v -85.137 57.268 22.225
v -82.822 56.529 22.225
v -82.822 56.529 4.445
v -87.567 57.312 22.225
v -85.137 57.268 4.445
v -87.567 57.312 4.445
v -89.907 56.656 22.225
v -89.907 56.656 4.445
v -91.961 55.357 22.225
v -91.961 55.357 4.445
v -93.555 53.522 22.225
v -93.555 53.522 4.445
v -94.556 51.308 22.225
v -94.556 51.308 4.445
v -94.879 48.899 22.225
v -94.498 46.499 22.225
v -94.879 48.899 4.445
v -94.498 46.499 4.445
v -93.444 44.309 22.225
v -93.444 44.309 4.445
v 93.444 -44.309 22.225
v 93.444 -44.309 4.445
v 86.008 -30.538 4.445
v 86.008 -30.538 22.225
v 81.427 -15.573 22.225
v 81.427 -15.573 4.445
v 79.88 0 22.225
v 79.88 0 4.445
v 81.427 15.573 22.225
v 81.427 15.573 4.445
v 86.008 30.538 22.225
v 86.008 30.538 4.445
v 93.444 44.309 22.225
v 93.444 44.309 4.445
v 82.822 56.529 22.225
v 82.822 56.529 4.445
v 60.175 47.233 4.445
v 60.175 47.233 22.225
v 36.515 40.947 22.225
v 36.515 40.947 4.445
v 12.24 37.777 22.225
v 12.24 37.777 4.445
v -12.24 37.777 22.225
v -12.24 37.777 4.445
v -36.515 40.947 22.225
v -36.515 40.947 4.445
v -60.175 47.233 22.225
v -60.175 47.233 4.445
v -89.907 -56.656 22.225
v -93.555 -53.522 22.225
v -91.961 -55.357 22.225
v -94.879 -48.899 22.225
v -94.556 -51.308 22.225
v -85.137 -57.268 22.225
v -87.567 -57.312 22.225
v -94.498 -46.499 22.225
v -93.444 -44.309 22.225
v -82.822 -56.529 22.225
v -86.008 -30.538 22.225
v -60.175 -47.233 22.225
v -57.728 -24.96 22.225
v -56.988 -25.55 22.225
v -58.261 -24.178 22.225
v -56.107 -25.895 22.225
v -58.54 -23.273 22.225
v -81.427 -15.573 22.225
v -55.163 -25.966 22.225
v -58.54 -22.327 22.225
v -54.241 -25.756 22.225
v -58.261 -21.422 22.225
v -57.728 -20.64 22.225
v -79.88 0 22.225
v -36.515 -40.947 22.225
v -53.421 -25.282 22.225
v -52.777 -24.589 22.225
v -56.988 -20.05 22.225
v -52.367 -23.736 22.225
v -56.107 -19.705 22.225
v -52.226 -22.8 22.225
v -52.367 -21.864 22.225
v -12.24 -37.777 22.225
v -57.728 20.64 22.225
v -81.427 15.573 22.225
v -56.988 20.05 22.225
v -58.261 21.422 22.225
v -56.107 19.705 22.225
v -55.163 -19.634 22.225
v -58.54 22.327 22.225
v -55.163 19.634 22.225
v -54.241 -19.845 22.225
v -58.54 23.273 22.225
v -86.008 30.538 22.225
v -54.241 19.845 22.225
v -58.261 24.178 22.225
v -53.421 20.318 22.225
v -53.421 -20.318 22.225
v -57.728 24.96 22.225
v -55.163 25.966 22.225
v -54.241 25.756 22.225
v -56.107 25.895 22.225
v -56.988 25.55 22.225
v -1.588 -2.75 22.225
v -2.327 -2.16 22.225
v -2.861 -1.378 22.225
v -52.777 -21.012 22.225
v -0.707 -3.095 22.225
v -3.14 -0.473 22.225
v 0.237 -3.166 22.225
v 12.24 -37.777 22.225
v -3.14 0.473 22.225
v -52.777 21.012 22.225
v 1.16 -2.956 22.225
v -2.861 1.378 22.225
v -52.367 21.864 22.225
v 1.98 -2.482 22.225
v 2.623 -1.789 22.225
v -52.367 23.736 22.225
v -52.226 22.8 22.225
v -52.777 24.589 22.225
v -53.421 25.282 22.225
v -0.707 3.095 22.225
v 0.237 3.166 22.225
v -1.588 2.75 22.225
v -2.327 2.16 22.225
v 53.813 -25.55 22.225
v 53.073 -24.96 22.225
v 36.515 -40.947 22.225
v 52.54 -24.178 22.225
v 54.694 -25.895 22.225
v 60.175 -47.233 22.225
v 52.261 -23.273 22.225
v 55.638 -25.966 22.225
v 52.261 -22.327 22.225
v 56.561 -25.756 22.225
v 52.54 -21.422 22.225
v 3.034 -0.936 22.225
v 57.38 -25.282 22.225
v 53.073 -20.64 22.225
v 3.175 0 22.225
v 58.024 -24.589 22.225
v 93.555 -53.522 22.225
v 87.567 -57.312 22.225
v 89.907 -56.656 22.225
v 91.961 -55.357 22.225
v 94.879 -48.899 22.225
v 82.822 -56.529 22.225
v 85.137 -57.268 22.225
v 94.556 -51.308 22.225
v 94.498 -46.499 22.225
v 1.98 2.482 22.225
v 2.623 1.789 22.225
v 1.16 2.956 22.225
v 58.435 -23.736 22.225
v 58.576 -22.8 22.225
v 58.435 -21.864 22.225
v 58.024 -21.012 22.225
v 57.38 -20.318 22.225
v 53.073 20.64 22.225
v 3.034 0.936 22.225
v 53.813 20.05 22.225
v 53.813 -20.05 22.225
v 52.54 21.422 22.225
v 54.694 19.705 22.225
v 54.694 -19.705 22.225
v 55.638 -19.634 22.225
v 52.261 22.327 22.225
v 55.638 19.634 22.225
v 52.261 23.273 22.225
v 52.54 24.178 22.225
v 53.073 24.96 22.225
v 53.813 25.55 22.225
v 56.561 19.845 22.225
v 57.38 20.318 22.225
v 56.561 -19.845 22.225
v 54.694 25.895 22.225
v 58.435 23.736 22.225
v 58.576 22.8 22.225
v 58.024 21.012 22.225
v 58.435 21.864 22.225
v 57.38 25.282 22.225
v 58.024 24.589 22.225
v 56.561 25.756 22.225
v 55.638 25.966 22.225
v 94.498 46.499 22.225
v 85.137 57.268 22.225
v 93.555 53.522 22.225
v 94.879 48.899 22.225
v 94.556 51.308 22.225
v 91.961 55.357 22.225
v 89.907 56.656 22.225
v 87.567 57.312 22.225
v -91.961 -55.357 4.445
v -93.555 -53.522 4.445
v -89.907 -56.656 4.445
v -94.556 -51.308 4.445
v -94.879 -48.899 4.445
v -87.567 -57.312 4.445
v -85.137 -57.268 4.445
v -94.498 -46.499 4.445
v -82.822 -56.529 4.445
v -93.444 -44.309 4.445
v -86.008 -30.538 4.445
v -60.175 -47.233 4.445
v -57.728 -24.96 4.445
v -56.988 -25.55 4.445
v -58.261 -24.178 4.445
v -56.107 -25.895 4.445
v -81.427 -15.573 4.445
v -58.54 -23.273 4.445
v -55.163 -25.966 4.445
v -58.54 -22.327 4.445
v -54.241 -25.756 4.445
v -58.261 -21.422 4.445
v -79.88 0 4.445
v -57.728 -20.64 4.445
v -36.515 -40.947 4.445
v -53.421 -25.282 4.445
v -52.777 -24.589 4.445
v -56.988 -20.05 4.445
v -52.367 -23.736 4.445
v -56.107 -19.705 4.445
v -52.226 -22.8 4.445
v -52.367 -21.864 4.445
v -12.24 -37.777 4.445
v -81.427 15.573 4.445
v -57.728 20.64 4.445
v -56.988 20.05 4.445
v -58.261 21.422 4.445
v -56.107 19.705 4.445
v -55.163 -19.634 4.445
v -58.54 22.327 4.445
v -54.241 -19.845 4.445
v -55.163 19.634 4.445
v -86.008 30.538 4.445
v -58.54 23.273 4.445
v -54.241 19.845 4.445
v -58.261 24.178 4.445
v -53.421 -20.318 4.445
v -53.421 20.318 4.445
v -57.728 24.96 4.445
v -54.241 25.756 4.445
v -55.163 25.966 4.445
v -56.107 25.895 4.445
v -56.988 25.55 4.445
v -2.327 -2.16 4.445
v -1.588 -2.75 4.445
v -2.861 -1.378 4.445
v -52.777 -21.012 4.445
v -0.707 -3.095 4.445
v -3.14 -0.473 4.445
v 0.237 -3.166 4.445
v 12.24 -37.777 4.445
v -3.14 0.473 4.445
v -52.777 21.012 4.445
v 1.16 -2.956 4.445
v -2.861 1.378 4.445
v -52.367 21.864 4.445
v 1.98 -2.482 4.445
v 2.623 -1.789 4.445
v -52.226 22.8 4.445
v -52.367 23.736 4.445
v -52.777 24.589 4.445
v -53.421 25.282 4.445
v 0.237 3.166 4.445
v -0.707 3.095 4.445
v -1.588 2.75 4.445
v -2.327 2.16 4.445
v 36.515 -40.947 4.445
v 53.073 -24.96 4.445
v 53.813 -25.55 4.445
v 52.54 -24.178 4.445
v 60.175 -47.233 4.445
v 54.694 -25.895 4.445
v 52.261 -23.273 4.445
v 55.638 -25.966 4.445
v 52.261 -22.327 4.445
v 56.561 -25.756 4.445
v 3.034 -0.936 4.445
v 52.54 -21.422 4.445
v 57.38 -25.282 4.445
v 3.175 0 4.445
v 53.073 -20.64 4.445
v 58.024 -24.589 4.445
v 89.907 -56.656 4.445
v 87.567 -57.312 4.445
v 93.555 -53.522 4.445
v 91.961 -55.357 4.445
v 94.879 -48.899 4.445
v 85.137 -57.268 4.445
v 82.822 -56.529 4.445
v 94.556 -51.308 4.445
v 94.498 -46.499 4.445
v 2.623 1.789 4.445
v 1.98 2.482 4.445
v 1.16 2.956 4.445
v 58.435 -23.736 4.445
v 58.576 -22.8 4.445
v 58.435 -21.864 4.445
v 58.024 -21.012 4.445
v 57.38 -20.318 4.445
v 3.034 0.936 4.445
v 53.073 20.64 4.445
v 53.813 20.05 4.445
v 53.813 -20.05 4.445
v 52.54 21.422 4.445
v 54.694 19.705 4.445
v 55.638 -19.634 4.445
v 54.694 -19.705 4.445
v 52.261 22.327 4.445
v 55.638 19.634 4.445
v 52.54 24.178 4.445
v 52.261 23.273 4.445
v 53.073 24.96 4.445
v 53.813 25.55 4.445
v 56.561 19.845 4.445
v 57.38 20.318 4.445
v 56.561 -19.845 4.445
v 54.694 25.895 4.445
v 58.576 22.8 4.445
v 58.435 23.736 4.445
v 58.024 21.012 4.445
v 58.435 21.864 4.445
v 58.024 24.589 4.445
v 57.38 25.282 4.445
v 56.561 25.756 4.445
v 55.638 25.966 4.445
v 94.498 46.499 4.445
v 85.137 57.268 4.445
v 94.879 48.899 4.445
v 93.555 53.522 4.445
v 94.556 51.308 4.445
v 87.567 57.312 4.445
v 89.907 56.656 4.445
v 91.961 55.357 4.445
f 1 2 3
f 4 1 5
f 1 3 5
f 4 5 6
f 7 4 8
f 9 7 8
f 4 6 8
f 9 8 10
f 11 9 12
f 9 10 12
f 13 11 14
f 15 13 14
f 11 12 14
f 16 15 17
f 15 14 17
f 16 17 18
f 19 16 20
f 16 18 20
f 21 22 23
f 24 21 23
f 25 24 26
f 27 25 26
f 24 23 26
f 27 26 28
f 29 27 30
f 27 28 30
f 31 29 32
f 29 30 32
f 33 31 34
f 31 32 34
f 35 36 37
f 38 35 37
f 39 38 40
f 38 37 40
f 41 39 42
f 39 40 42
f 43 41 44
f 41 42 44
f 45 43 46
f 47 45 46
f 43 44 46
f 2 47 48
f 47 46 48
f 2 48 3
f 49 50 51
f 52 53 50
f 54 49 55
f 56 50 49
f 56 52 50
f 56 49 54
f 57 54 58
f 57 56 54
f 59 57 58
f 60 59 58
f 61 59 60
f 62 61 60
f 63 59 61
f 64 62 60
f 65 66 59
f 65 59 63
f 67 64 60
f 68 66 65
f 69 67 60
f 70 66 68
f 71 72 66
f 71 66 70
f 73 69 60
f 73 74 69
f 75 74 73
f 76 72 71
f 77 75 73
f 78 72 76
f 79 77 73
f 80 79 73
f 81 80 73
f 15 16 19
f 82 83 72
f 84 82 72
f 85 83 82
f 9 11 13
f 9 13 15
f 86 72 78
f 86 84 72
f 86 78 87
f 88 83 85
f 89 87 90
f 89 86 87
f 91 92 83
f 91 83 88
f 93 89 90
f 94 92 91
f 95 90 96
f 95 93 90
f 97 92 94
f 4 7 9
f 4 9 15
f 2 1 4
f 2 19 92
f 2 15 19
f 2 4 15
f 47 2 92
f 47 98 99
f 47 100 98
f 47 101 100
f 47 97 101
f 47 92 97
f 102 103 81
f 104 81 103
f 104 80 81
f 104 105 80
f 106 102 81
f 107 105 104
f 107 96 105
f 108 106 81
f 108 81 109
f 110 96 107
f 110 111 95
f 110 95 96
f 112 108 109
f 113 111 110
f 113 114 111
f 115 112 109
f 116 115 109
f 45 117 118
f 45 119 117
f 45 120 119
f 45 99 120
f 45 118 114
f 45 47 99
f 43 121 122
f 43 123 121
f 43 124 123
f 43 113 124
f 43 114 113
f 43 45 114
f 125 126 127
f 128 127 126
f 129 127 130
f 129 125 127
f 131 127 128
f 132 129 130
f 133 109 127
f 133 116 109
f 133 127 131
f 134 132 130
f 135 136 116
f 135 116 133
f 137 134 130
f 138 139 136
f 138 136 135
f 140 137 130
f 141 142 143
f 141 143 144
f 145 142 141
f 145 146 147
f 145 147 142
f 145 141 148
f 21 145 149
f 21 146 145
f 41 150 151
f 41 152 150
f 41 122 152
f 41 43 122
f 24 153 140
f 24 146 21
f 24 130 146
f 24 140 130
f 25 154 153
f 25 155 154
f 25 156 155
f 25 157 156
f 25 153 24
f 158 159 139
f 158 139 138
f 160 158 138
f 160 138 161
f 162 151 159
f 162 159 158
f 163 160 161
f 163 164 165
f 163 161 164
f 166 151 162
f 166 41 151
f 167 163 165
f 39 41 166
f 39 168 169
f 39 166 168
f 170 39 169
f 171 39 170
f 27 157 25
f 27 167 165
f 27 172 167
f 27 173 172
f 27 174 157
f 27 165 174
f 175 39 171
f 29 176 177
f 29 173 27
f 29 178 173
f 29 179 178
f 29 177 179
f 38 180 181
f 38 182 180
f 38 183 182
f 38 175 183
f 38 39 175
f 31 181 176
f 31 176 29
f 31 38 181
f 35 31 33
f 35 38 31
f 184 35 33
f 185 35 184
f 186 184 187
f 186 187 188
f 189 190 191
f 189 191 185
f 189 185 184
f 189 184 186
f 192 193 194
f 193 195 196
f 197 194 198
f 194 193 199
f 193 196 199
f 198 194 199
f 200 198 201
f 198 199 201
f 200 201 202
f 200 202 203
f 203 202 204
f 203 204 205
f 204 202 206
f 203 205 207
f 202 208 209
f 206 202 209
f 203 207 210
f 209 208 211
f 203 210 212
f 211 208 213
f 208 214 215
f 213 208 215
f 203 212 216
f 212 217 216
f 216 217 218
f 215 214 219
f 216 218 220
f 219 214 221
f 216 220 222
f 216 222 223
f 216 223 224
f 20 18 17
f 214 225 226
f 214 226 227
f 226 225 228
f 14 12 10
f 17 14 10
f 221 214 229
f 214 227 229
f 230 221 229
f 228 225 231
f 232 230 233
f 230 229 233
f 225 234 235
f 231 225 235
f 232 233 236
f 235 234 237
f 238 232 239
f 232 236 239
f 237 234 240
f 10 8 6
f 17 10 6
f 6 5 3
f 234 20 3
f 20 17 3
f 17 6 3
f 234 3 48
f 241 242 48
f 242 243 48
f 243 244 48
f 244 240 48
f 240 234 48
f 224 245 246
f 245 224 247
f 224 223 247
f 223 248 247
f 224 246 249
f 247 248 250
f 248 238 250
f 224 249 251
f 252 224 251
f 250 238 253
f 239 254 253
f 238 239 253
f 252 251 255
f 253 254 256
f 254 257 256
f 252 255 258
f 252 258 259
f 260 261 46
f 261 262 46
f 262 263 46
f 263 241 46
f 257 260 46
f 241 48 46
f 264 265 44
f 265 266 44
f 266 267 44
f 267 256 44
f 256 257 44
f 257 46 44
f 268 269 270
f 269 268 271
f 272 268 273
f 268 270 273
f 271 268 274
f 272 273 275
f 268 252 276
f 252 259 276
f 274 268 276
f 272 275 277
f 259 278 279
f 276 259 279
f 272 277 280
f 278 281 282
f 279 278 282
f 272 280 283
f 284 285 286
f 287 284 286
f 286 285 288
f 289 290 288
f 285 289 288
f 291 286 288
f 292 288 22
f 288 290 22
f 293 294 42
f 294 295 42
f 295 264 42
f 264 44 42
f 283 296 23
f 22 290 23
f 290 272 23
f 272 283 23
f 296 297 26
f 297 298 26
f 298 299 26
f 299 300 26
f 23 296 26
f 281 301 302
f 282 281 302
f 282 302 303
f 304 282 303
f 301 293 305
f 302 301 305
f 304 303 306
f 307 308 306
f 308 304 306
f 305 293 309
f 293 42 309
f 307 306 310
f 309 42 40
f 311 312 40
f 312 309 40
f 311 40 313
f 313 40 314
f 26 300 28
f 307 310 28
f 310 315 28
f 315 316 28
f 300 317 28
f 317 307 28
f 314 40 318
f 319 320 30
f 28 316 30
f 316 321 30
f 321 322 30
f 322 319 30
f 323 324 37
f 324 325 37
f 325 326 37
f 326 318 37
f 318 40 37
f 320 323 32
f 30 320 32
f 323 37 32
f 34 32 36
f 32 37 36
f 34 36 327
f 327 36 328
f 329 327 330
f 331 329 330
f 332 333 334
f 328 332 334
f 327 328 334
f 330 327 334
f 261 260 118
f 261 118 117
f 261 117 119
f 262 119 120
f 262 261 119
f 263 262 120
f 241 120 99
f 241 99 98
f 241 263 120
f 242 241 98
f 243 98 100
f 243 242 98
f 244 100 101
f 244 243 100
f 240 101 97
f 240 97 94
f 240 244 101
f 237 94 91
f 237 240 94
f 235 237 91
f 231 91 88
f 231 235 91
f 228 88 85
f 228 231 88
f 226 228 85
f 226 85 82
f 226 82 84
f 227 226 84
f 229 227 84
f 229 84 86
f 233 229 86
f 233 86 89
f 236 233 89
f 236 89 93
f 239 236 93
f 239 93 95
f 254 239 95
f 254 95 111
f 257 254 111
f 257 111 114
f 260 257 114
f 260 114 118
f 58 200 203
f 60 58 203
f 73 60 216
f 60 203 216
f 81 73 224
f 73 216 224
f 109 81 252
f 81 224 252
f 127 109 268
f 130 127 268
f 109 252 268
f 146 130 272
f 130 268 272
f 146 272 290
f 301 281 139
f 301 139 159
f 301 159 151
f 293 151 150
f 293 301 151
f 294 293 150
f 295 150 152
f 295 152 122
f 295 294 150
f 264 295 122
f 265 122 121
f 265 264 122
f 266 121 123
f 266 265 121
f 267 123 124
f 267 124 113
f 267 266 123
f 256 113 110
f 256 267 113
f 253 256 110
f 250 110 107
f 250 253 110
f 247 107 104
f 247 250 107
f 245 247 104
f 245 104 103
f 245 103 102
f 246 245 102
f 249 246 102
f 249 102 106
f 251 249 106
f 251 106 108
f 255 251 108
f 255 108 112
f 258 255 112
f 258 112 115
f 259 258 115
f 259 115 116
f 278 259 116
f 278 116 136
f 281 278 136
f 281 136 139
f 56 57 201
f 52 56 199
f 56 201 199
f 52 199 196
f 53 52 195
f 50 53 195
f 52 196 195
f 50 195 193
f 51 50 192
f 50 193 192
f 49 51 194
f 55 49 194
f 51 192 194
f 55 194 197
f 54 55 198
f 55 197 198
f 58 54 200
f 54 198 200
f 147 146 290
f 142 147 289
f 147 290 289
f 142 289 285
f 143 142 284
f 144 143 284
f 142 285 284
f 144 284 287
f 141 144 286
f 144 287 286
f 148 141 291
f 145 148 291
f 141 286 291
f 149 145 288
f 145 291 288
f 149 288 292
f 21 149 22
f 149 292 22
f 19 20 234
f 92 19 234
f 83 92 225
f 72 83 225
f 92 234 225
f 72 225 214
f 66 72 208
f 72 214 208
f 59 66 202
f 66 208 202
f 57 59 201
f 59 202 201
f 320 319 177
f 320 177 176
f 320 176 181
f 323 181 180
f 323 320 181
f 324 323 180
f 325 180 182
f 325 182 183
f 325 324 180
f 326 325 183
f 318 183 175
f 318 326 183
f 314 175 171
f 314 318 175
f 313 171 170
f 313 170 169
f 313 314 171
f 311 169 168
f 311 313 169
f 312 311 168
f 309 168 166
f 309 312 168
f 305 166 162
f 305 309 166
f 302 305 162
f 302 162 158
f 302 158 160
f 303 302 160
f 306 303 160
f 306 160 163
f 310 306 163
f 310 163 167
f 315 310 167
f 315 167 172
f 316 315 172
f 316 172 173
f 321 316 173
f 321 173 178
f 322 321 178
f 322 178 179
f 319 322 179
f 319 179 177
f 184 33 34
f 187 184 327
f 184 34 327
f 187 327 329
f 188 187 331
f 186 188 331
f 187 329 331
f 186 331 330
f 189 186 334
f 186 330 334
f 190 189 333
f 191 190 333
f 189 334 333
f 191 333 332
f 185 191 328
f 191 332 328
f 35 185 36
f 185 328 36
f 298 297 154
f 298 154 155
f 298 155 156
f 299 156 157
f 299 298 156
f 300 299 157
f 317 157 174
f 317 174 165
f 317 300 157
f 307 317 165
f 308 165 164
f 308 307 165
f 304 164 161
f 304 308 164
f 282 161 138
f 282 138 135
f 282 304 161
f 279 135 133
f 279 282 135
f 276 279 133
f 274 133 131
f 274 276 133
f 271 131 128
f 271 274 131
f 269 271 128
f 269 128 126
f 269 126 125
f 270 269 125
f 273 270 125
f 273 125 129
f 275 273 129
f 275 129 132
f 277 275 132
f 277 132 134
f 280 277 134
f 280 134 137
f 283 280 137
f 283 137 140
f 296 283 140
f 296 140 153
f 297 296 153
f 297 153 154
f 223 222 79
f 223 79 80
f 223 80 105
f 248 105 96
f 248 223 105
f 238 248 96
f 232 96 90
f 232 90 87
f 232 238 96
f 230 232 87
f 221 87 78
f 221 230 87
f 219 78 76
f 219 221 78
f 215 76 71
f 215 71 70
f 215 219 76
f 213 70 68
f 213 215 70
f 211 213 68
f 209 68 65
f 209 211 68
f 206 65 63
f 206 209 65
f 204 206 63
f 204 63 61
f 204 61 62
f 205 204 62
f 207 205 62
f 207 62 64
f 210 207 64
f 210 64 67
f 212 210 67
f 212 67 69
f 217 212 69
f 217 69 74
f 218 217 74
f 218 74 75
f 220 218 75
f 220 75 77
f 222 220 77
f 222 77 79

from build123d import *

# Parameters (mm, degrees)
F0_R     = 3.175
F1_DEPTH = 19.05
F2_DEPTH = 22.225
F3_DEPTH = 4.445


# Not quite as in the source:
# - a feature names something its author has since deleted; it is built from what else it names


with BuildPart() as f1:
    # F0 (on Top) → F1 (new body)
    with BuildSketch(Plane.XY):
        with BuildLine():
            ThreePointArc((82.8215071839, 56.5294814298), (0, 37.38), (-82.8215071839, 56.5294814298))
            ThreePointArc((-82.8215071839, 56.5294814298), (-92.8246316261, 54.4975844509), (-93.4439756283, 44.3089870526))
            ThreePointArc((-93.4439756283, 44.3089870526), (-79.88, 0), (-93.4439756283, -44.3089870526))
            ThreePointArc((-93.4439756283, -44.3089870526), (-92.8246316261, -54.4975844509), (-82.8215071839, -56.5294814298))
            ThreePointArc((-82.8215071839, -56.5294814298), (0, -37.38), (82.8215071839, -56.5294814298))
            ThreePointArc((82.8215071839, -56.5294814298), (92.8246316261, -54.4975844509), (93.4439756283, -44.3089870526))
            ThreePointArc((93.4439756283, -44.3089870526), (79.88, 0), (93.4439756283, 44.3089870526))
            ThreePointArc((93.4439756283, 44.3089870526), (92.8246316261, 54.4975844509), (82.8215071839, 56.5294814298))
        make_face()
        with Locations((-55.4007254541, -22.8000469506)):
            Circle(F0_R, mode=Mode.SUBTRACT)
        Circle(F0_R, mode=Mode.SUBTRACT)
        with Locations((55.4007254541, -22.8000469506)):
            Circle(F0_R, mode=Mode.SUBTRACT)
        with Locations((-55.4007254541, 22.8000469506)):
            Circle(F0_R, mode=Mode.SUBTRACT)
        with Locations((55.4007254541, 22.8000469506)):
            Circle(F0_R, mode=Mode.SUBTRACT)
    extrude(amount=F1_DEPTH)

    # F0 (on Top) → F2 (join)
    with BuildSketch(Plane.XY):
        with BuildLine():
            ThreePointArc((82.8215071839, 56.5294814298), (0, 37.38), (-82.8215071839, 56.5294814298))
            ThreePointArc((-82.8215071839, 56.5294814298), (-92.8246316261, 54.4975844509), (-93.4439756283, 44.3089870526))
            ThreePointArc((-93.4439756283, 44.3089870526), (-79.88, 0), (-93.4439756283, -44.3089870526))
            ThreePointArc((-93.4439756283, -44.3089870526), (-92.8246316261, -54.4975844509), (-82.8215071839, -56.5294814298))
            ThreePointArc((-82.8215071839, -56.5294814298), (0, -37.38), (82.8215071839, -56.5294814298))
            ThreePointArc((82.8215071839, -56.5294814298), (92.8246316261, -54.4975844509), (93.4439756283, -44.3089870526))
            ThreePointArc((93.4439756283, -44.3089870526), (79.88, 0), (93.4439756283, 44.3089870526))
            ThreePointArc((93.4439756283, 44.3089870526), (92.8246316261, 54.4975844509), (82.8215071839, 56.5294814298))
        make_face()
        with Locations((-55.4007254541, -22.8000469506)):
            Circle(F0_R, mode=Mode.SUBTRACT)
        Circle(F0_R, mode=Mode.SUBTRACT)
        with Locations((55.4007254541, -22.8000469506)):
            Circle(F0_R, mode=Mode.SUBTRACT)
        with Locations((-55.4007254541, 22.8000469506)):
            Circle(F0_R, mode=Mode.SUBTRACT)
        with Locations((55.4007254541, 22.8000469506)):
            Circle(F0_R, mode=Mode.SUBTRACT)
    extrude(amount=F2_DEPTH)

    # F0 (on Top) → F3 (cut)
    with BuildSketch(Plane.XY):
        with BuildLine():
            ThreePointArc((82.8215071839, 56.5294814298), (0, 37.38), (-82.8215071839, 56.5294814298))
            ThreePointArc((-82.8215071839, 56.5294814298), (-92.8246316261, 54.4975844509), (-93.4439756283, 44.3089870526))
            ThreePointArc((-93.4439756283, 44.3089870526), (-79.88, 0), (-93.4439756283, -44.3089870526))
            ThreePointArc((-93.4439756283, -44.3089870526), (-92.8246316261, -54.4975844509), (-82.8215071839, -56.5294814298))
            ThreePointArc((-82.8215071839, -56.5294814298), (0, -37.38), (82.8215071839, -56.5294814298))
            ThreePointArc((82.8215071839, -56.5294814298), (92.8246316261, -54.4975844509), (93.4439756283, -44.3089870526))
            ThreePointArc((93.4439756283, -44.3089870526), (79.88, 0), (93.4439756283, 44.3089870526))
            ThreePointArc((93.4439756283, 44.3089870526), (92.8246316261, 54.4975844509), (82.8215071839, 56.5294814298))
        make_face()
        with Locations((-55.4007254541, -22.8000469506)):
            Circle(F0_R, mode=Mode.SUBTRACT)
        Circle(F0_R, mode=Mode.SUBTRACT)
        with Locations((55.4007254541, -22.8000469506)):
            Circle(F0_R, mode=Mode.SUBTRACT)
        with Locations((-55.4007254541, 22.8000469506)):
            Circle(F0_R, mode=Mode.SUBTRACT)
        with Locations((55.4007254541, 22.8000469506)):
            Circle(F0_R, mode=Mode.SUBTRACT)
    extrude(amount=F3_DEPTH, mode=Mode.SUBTRACT)


solid = f1.part
